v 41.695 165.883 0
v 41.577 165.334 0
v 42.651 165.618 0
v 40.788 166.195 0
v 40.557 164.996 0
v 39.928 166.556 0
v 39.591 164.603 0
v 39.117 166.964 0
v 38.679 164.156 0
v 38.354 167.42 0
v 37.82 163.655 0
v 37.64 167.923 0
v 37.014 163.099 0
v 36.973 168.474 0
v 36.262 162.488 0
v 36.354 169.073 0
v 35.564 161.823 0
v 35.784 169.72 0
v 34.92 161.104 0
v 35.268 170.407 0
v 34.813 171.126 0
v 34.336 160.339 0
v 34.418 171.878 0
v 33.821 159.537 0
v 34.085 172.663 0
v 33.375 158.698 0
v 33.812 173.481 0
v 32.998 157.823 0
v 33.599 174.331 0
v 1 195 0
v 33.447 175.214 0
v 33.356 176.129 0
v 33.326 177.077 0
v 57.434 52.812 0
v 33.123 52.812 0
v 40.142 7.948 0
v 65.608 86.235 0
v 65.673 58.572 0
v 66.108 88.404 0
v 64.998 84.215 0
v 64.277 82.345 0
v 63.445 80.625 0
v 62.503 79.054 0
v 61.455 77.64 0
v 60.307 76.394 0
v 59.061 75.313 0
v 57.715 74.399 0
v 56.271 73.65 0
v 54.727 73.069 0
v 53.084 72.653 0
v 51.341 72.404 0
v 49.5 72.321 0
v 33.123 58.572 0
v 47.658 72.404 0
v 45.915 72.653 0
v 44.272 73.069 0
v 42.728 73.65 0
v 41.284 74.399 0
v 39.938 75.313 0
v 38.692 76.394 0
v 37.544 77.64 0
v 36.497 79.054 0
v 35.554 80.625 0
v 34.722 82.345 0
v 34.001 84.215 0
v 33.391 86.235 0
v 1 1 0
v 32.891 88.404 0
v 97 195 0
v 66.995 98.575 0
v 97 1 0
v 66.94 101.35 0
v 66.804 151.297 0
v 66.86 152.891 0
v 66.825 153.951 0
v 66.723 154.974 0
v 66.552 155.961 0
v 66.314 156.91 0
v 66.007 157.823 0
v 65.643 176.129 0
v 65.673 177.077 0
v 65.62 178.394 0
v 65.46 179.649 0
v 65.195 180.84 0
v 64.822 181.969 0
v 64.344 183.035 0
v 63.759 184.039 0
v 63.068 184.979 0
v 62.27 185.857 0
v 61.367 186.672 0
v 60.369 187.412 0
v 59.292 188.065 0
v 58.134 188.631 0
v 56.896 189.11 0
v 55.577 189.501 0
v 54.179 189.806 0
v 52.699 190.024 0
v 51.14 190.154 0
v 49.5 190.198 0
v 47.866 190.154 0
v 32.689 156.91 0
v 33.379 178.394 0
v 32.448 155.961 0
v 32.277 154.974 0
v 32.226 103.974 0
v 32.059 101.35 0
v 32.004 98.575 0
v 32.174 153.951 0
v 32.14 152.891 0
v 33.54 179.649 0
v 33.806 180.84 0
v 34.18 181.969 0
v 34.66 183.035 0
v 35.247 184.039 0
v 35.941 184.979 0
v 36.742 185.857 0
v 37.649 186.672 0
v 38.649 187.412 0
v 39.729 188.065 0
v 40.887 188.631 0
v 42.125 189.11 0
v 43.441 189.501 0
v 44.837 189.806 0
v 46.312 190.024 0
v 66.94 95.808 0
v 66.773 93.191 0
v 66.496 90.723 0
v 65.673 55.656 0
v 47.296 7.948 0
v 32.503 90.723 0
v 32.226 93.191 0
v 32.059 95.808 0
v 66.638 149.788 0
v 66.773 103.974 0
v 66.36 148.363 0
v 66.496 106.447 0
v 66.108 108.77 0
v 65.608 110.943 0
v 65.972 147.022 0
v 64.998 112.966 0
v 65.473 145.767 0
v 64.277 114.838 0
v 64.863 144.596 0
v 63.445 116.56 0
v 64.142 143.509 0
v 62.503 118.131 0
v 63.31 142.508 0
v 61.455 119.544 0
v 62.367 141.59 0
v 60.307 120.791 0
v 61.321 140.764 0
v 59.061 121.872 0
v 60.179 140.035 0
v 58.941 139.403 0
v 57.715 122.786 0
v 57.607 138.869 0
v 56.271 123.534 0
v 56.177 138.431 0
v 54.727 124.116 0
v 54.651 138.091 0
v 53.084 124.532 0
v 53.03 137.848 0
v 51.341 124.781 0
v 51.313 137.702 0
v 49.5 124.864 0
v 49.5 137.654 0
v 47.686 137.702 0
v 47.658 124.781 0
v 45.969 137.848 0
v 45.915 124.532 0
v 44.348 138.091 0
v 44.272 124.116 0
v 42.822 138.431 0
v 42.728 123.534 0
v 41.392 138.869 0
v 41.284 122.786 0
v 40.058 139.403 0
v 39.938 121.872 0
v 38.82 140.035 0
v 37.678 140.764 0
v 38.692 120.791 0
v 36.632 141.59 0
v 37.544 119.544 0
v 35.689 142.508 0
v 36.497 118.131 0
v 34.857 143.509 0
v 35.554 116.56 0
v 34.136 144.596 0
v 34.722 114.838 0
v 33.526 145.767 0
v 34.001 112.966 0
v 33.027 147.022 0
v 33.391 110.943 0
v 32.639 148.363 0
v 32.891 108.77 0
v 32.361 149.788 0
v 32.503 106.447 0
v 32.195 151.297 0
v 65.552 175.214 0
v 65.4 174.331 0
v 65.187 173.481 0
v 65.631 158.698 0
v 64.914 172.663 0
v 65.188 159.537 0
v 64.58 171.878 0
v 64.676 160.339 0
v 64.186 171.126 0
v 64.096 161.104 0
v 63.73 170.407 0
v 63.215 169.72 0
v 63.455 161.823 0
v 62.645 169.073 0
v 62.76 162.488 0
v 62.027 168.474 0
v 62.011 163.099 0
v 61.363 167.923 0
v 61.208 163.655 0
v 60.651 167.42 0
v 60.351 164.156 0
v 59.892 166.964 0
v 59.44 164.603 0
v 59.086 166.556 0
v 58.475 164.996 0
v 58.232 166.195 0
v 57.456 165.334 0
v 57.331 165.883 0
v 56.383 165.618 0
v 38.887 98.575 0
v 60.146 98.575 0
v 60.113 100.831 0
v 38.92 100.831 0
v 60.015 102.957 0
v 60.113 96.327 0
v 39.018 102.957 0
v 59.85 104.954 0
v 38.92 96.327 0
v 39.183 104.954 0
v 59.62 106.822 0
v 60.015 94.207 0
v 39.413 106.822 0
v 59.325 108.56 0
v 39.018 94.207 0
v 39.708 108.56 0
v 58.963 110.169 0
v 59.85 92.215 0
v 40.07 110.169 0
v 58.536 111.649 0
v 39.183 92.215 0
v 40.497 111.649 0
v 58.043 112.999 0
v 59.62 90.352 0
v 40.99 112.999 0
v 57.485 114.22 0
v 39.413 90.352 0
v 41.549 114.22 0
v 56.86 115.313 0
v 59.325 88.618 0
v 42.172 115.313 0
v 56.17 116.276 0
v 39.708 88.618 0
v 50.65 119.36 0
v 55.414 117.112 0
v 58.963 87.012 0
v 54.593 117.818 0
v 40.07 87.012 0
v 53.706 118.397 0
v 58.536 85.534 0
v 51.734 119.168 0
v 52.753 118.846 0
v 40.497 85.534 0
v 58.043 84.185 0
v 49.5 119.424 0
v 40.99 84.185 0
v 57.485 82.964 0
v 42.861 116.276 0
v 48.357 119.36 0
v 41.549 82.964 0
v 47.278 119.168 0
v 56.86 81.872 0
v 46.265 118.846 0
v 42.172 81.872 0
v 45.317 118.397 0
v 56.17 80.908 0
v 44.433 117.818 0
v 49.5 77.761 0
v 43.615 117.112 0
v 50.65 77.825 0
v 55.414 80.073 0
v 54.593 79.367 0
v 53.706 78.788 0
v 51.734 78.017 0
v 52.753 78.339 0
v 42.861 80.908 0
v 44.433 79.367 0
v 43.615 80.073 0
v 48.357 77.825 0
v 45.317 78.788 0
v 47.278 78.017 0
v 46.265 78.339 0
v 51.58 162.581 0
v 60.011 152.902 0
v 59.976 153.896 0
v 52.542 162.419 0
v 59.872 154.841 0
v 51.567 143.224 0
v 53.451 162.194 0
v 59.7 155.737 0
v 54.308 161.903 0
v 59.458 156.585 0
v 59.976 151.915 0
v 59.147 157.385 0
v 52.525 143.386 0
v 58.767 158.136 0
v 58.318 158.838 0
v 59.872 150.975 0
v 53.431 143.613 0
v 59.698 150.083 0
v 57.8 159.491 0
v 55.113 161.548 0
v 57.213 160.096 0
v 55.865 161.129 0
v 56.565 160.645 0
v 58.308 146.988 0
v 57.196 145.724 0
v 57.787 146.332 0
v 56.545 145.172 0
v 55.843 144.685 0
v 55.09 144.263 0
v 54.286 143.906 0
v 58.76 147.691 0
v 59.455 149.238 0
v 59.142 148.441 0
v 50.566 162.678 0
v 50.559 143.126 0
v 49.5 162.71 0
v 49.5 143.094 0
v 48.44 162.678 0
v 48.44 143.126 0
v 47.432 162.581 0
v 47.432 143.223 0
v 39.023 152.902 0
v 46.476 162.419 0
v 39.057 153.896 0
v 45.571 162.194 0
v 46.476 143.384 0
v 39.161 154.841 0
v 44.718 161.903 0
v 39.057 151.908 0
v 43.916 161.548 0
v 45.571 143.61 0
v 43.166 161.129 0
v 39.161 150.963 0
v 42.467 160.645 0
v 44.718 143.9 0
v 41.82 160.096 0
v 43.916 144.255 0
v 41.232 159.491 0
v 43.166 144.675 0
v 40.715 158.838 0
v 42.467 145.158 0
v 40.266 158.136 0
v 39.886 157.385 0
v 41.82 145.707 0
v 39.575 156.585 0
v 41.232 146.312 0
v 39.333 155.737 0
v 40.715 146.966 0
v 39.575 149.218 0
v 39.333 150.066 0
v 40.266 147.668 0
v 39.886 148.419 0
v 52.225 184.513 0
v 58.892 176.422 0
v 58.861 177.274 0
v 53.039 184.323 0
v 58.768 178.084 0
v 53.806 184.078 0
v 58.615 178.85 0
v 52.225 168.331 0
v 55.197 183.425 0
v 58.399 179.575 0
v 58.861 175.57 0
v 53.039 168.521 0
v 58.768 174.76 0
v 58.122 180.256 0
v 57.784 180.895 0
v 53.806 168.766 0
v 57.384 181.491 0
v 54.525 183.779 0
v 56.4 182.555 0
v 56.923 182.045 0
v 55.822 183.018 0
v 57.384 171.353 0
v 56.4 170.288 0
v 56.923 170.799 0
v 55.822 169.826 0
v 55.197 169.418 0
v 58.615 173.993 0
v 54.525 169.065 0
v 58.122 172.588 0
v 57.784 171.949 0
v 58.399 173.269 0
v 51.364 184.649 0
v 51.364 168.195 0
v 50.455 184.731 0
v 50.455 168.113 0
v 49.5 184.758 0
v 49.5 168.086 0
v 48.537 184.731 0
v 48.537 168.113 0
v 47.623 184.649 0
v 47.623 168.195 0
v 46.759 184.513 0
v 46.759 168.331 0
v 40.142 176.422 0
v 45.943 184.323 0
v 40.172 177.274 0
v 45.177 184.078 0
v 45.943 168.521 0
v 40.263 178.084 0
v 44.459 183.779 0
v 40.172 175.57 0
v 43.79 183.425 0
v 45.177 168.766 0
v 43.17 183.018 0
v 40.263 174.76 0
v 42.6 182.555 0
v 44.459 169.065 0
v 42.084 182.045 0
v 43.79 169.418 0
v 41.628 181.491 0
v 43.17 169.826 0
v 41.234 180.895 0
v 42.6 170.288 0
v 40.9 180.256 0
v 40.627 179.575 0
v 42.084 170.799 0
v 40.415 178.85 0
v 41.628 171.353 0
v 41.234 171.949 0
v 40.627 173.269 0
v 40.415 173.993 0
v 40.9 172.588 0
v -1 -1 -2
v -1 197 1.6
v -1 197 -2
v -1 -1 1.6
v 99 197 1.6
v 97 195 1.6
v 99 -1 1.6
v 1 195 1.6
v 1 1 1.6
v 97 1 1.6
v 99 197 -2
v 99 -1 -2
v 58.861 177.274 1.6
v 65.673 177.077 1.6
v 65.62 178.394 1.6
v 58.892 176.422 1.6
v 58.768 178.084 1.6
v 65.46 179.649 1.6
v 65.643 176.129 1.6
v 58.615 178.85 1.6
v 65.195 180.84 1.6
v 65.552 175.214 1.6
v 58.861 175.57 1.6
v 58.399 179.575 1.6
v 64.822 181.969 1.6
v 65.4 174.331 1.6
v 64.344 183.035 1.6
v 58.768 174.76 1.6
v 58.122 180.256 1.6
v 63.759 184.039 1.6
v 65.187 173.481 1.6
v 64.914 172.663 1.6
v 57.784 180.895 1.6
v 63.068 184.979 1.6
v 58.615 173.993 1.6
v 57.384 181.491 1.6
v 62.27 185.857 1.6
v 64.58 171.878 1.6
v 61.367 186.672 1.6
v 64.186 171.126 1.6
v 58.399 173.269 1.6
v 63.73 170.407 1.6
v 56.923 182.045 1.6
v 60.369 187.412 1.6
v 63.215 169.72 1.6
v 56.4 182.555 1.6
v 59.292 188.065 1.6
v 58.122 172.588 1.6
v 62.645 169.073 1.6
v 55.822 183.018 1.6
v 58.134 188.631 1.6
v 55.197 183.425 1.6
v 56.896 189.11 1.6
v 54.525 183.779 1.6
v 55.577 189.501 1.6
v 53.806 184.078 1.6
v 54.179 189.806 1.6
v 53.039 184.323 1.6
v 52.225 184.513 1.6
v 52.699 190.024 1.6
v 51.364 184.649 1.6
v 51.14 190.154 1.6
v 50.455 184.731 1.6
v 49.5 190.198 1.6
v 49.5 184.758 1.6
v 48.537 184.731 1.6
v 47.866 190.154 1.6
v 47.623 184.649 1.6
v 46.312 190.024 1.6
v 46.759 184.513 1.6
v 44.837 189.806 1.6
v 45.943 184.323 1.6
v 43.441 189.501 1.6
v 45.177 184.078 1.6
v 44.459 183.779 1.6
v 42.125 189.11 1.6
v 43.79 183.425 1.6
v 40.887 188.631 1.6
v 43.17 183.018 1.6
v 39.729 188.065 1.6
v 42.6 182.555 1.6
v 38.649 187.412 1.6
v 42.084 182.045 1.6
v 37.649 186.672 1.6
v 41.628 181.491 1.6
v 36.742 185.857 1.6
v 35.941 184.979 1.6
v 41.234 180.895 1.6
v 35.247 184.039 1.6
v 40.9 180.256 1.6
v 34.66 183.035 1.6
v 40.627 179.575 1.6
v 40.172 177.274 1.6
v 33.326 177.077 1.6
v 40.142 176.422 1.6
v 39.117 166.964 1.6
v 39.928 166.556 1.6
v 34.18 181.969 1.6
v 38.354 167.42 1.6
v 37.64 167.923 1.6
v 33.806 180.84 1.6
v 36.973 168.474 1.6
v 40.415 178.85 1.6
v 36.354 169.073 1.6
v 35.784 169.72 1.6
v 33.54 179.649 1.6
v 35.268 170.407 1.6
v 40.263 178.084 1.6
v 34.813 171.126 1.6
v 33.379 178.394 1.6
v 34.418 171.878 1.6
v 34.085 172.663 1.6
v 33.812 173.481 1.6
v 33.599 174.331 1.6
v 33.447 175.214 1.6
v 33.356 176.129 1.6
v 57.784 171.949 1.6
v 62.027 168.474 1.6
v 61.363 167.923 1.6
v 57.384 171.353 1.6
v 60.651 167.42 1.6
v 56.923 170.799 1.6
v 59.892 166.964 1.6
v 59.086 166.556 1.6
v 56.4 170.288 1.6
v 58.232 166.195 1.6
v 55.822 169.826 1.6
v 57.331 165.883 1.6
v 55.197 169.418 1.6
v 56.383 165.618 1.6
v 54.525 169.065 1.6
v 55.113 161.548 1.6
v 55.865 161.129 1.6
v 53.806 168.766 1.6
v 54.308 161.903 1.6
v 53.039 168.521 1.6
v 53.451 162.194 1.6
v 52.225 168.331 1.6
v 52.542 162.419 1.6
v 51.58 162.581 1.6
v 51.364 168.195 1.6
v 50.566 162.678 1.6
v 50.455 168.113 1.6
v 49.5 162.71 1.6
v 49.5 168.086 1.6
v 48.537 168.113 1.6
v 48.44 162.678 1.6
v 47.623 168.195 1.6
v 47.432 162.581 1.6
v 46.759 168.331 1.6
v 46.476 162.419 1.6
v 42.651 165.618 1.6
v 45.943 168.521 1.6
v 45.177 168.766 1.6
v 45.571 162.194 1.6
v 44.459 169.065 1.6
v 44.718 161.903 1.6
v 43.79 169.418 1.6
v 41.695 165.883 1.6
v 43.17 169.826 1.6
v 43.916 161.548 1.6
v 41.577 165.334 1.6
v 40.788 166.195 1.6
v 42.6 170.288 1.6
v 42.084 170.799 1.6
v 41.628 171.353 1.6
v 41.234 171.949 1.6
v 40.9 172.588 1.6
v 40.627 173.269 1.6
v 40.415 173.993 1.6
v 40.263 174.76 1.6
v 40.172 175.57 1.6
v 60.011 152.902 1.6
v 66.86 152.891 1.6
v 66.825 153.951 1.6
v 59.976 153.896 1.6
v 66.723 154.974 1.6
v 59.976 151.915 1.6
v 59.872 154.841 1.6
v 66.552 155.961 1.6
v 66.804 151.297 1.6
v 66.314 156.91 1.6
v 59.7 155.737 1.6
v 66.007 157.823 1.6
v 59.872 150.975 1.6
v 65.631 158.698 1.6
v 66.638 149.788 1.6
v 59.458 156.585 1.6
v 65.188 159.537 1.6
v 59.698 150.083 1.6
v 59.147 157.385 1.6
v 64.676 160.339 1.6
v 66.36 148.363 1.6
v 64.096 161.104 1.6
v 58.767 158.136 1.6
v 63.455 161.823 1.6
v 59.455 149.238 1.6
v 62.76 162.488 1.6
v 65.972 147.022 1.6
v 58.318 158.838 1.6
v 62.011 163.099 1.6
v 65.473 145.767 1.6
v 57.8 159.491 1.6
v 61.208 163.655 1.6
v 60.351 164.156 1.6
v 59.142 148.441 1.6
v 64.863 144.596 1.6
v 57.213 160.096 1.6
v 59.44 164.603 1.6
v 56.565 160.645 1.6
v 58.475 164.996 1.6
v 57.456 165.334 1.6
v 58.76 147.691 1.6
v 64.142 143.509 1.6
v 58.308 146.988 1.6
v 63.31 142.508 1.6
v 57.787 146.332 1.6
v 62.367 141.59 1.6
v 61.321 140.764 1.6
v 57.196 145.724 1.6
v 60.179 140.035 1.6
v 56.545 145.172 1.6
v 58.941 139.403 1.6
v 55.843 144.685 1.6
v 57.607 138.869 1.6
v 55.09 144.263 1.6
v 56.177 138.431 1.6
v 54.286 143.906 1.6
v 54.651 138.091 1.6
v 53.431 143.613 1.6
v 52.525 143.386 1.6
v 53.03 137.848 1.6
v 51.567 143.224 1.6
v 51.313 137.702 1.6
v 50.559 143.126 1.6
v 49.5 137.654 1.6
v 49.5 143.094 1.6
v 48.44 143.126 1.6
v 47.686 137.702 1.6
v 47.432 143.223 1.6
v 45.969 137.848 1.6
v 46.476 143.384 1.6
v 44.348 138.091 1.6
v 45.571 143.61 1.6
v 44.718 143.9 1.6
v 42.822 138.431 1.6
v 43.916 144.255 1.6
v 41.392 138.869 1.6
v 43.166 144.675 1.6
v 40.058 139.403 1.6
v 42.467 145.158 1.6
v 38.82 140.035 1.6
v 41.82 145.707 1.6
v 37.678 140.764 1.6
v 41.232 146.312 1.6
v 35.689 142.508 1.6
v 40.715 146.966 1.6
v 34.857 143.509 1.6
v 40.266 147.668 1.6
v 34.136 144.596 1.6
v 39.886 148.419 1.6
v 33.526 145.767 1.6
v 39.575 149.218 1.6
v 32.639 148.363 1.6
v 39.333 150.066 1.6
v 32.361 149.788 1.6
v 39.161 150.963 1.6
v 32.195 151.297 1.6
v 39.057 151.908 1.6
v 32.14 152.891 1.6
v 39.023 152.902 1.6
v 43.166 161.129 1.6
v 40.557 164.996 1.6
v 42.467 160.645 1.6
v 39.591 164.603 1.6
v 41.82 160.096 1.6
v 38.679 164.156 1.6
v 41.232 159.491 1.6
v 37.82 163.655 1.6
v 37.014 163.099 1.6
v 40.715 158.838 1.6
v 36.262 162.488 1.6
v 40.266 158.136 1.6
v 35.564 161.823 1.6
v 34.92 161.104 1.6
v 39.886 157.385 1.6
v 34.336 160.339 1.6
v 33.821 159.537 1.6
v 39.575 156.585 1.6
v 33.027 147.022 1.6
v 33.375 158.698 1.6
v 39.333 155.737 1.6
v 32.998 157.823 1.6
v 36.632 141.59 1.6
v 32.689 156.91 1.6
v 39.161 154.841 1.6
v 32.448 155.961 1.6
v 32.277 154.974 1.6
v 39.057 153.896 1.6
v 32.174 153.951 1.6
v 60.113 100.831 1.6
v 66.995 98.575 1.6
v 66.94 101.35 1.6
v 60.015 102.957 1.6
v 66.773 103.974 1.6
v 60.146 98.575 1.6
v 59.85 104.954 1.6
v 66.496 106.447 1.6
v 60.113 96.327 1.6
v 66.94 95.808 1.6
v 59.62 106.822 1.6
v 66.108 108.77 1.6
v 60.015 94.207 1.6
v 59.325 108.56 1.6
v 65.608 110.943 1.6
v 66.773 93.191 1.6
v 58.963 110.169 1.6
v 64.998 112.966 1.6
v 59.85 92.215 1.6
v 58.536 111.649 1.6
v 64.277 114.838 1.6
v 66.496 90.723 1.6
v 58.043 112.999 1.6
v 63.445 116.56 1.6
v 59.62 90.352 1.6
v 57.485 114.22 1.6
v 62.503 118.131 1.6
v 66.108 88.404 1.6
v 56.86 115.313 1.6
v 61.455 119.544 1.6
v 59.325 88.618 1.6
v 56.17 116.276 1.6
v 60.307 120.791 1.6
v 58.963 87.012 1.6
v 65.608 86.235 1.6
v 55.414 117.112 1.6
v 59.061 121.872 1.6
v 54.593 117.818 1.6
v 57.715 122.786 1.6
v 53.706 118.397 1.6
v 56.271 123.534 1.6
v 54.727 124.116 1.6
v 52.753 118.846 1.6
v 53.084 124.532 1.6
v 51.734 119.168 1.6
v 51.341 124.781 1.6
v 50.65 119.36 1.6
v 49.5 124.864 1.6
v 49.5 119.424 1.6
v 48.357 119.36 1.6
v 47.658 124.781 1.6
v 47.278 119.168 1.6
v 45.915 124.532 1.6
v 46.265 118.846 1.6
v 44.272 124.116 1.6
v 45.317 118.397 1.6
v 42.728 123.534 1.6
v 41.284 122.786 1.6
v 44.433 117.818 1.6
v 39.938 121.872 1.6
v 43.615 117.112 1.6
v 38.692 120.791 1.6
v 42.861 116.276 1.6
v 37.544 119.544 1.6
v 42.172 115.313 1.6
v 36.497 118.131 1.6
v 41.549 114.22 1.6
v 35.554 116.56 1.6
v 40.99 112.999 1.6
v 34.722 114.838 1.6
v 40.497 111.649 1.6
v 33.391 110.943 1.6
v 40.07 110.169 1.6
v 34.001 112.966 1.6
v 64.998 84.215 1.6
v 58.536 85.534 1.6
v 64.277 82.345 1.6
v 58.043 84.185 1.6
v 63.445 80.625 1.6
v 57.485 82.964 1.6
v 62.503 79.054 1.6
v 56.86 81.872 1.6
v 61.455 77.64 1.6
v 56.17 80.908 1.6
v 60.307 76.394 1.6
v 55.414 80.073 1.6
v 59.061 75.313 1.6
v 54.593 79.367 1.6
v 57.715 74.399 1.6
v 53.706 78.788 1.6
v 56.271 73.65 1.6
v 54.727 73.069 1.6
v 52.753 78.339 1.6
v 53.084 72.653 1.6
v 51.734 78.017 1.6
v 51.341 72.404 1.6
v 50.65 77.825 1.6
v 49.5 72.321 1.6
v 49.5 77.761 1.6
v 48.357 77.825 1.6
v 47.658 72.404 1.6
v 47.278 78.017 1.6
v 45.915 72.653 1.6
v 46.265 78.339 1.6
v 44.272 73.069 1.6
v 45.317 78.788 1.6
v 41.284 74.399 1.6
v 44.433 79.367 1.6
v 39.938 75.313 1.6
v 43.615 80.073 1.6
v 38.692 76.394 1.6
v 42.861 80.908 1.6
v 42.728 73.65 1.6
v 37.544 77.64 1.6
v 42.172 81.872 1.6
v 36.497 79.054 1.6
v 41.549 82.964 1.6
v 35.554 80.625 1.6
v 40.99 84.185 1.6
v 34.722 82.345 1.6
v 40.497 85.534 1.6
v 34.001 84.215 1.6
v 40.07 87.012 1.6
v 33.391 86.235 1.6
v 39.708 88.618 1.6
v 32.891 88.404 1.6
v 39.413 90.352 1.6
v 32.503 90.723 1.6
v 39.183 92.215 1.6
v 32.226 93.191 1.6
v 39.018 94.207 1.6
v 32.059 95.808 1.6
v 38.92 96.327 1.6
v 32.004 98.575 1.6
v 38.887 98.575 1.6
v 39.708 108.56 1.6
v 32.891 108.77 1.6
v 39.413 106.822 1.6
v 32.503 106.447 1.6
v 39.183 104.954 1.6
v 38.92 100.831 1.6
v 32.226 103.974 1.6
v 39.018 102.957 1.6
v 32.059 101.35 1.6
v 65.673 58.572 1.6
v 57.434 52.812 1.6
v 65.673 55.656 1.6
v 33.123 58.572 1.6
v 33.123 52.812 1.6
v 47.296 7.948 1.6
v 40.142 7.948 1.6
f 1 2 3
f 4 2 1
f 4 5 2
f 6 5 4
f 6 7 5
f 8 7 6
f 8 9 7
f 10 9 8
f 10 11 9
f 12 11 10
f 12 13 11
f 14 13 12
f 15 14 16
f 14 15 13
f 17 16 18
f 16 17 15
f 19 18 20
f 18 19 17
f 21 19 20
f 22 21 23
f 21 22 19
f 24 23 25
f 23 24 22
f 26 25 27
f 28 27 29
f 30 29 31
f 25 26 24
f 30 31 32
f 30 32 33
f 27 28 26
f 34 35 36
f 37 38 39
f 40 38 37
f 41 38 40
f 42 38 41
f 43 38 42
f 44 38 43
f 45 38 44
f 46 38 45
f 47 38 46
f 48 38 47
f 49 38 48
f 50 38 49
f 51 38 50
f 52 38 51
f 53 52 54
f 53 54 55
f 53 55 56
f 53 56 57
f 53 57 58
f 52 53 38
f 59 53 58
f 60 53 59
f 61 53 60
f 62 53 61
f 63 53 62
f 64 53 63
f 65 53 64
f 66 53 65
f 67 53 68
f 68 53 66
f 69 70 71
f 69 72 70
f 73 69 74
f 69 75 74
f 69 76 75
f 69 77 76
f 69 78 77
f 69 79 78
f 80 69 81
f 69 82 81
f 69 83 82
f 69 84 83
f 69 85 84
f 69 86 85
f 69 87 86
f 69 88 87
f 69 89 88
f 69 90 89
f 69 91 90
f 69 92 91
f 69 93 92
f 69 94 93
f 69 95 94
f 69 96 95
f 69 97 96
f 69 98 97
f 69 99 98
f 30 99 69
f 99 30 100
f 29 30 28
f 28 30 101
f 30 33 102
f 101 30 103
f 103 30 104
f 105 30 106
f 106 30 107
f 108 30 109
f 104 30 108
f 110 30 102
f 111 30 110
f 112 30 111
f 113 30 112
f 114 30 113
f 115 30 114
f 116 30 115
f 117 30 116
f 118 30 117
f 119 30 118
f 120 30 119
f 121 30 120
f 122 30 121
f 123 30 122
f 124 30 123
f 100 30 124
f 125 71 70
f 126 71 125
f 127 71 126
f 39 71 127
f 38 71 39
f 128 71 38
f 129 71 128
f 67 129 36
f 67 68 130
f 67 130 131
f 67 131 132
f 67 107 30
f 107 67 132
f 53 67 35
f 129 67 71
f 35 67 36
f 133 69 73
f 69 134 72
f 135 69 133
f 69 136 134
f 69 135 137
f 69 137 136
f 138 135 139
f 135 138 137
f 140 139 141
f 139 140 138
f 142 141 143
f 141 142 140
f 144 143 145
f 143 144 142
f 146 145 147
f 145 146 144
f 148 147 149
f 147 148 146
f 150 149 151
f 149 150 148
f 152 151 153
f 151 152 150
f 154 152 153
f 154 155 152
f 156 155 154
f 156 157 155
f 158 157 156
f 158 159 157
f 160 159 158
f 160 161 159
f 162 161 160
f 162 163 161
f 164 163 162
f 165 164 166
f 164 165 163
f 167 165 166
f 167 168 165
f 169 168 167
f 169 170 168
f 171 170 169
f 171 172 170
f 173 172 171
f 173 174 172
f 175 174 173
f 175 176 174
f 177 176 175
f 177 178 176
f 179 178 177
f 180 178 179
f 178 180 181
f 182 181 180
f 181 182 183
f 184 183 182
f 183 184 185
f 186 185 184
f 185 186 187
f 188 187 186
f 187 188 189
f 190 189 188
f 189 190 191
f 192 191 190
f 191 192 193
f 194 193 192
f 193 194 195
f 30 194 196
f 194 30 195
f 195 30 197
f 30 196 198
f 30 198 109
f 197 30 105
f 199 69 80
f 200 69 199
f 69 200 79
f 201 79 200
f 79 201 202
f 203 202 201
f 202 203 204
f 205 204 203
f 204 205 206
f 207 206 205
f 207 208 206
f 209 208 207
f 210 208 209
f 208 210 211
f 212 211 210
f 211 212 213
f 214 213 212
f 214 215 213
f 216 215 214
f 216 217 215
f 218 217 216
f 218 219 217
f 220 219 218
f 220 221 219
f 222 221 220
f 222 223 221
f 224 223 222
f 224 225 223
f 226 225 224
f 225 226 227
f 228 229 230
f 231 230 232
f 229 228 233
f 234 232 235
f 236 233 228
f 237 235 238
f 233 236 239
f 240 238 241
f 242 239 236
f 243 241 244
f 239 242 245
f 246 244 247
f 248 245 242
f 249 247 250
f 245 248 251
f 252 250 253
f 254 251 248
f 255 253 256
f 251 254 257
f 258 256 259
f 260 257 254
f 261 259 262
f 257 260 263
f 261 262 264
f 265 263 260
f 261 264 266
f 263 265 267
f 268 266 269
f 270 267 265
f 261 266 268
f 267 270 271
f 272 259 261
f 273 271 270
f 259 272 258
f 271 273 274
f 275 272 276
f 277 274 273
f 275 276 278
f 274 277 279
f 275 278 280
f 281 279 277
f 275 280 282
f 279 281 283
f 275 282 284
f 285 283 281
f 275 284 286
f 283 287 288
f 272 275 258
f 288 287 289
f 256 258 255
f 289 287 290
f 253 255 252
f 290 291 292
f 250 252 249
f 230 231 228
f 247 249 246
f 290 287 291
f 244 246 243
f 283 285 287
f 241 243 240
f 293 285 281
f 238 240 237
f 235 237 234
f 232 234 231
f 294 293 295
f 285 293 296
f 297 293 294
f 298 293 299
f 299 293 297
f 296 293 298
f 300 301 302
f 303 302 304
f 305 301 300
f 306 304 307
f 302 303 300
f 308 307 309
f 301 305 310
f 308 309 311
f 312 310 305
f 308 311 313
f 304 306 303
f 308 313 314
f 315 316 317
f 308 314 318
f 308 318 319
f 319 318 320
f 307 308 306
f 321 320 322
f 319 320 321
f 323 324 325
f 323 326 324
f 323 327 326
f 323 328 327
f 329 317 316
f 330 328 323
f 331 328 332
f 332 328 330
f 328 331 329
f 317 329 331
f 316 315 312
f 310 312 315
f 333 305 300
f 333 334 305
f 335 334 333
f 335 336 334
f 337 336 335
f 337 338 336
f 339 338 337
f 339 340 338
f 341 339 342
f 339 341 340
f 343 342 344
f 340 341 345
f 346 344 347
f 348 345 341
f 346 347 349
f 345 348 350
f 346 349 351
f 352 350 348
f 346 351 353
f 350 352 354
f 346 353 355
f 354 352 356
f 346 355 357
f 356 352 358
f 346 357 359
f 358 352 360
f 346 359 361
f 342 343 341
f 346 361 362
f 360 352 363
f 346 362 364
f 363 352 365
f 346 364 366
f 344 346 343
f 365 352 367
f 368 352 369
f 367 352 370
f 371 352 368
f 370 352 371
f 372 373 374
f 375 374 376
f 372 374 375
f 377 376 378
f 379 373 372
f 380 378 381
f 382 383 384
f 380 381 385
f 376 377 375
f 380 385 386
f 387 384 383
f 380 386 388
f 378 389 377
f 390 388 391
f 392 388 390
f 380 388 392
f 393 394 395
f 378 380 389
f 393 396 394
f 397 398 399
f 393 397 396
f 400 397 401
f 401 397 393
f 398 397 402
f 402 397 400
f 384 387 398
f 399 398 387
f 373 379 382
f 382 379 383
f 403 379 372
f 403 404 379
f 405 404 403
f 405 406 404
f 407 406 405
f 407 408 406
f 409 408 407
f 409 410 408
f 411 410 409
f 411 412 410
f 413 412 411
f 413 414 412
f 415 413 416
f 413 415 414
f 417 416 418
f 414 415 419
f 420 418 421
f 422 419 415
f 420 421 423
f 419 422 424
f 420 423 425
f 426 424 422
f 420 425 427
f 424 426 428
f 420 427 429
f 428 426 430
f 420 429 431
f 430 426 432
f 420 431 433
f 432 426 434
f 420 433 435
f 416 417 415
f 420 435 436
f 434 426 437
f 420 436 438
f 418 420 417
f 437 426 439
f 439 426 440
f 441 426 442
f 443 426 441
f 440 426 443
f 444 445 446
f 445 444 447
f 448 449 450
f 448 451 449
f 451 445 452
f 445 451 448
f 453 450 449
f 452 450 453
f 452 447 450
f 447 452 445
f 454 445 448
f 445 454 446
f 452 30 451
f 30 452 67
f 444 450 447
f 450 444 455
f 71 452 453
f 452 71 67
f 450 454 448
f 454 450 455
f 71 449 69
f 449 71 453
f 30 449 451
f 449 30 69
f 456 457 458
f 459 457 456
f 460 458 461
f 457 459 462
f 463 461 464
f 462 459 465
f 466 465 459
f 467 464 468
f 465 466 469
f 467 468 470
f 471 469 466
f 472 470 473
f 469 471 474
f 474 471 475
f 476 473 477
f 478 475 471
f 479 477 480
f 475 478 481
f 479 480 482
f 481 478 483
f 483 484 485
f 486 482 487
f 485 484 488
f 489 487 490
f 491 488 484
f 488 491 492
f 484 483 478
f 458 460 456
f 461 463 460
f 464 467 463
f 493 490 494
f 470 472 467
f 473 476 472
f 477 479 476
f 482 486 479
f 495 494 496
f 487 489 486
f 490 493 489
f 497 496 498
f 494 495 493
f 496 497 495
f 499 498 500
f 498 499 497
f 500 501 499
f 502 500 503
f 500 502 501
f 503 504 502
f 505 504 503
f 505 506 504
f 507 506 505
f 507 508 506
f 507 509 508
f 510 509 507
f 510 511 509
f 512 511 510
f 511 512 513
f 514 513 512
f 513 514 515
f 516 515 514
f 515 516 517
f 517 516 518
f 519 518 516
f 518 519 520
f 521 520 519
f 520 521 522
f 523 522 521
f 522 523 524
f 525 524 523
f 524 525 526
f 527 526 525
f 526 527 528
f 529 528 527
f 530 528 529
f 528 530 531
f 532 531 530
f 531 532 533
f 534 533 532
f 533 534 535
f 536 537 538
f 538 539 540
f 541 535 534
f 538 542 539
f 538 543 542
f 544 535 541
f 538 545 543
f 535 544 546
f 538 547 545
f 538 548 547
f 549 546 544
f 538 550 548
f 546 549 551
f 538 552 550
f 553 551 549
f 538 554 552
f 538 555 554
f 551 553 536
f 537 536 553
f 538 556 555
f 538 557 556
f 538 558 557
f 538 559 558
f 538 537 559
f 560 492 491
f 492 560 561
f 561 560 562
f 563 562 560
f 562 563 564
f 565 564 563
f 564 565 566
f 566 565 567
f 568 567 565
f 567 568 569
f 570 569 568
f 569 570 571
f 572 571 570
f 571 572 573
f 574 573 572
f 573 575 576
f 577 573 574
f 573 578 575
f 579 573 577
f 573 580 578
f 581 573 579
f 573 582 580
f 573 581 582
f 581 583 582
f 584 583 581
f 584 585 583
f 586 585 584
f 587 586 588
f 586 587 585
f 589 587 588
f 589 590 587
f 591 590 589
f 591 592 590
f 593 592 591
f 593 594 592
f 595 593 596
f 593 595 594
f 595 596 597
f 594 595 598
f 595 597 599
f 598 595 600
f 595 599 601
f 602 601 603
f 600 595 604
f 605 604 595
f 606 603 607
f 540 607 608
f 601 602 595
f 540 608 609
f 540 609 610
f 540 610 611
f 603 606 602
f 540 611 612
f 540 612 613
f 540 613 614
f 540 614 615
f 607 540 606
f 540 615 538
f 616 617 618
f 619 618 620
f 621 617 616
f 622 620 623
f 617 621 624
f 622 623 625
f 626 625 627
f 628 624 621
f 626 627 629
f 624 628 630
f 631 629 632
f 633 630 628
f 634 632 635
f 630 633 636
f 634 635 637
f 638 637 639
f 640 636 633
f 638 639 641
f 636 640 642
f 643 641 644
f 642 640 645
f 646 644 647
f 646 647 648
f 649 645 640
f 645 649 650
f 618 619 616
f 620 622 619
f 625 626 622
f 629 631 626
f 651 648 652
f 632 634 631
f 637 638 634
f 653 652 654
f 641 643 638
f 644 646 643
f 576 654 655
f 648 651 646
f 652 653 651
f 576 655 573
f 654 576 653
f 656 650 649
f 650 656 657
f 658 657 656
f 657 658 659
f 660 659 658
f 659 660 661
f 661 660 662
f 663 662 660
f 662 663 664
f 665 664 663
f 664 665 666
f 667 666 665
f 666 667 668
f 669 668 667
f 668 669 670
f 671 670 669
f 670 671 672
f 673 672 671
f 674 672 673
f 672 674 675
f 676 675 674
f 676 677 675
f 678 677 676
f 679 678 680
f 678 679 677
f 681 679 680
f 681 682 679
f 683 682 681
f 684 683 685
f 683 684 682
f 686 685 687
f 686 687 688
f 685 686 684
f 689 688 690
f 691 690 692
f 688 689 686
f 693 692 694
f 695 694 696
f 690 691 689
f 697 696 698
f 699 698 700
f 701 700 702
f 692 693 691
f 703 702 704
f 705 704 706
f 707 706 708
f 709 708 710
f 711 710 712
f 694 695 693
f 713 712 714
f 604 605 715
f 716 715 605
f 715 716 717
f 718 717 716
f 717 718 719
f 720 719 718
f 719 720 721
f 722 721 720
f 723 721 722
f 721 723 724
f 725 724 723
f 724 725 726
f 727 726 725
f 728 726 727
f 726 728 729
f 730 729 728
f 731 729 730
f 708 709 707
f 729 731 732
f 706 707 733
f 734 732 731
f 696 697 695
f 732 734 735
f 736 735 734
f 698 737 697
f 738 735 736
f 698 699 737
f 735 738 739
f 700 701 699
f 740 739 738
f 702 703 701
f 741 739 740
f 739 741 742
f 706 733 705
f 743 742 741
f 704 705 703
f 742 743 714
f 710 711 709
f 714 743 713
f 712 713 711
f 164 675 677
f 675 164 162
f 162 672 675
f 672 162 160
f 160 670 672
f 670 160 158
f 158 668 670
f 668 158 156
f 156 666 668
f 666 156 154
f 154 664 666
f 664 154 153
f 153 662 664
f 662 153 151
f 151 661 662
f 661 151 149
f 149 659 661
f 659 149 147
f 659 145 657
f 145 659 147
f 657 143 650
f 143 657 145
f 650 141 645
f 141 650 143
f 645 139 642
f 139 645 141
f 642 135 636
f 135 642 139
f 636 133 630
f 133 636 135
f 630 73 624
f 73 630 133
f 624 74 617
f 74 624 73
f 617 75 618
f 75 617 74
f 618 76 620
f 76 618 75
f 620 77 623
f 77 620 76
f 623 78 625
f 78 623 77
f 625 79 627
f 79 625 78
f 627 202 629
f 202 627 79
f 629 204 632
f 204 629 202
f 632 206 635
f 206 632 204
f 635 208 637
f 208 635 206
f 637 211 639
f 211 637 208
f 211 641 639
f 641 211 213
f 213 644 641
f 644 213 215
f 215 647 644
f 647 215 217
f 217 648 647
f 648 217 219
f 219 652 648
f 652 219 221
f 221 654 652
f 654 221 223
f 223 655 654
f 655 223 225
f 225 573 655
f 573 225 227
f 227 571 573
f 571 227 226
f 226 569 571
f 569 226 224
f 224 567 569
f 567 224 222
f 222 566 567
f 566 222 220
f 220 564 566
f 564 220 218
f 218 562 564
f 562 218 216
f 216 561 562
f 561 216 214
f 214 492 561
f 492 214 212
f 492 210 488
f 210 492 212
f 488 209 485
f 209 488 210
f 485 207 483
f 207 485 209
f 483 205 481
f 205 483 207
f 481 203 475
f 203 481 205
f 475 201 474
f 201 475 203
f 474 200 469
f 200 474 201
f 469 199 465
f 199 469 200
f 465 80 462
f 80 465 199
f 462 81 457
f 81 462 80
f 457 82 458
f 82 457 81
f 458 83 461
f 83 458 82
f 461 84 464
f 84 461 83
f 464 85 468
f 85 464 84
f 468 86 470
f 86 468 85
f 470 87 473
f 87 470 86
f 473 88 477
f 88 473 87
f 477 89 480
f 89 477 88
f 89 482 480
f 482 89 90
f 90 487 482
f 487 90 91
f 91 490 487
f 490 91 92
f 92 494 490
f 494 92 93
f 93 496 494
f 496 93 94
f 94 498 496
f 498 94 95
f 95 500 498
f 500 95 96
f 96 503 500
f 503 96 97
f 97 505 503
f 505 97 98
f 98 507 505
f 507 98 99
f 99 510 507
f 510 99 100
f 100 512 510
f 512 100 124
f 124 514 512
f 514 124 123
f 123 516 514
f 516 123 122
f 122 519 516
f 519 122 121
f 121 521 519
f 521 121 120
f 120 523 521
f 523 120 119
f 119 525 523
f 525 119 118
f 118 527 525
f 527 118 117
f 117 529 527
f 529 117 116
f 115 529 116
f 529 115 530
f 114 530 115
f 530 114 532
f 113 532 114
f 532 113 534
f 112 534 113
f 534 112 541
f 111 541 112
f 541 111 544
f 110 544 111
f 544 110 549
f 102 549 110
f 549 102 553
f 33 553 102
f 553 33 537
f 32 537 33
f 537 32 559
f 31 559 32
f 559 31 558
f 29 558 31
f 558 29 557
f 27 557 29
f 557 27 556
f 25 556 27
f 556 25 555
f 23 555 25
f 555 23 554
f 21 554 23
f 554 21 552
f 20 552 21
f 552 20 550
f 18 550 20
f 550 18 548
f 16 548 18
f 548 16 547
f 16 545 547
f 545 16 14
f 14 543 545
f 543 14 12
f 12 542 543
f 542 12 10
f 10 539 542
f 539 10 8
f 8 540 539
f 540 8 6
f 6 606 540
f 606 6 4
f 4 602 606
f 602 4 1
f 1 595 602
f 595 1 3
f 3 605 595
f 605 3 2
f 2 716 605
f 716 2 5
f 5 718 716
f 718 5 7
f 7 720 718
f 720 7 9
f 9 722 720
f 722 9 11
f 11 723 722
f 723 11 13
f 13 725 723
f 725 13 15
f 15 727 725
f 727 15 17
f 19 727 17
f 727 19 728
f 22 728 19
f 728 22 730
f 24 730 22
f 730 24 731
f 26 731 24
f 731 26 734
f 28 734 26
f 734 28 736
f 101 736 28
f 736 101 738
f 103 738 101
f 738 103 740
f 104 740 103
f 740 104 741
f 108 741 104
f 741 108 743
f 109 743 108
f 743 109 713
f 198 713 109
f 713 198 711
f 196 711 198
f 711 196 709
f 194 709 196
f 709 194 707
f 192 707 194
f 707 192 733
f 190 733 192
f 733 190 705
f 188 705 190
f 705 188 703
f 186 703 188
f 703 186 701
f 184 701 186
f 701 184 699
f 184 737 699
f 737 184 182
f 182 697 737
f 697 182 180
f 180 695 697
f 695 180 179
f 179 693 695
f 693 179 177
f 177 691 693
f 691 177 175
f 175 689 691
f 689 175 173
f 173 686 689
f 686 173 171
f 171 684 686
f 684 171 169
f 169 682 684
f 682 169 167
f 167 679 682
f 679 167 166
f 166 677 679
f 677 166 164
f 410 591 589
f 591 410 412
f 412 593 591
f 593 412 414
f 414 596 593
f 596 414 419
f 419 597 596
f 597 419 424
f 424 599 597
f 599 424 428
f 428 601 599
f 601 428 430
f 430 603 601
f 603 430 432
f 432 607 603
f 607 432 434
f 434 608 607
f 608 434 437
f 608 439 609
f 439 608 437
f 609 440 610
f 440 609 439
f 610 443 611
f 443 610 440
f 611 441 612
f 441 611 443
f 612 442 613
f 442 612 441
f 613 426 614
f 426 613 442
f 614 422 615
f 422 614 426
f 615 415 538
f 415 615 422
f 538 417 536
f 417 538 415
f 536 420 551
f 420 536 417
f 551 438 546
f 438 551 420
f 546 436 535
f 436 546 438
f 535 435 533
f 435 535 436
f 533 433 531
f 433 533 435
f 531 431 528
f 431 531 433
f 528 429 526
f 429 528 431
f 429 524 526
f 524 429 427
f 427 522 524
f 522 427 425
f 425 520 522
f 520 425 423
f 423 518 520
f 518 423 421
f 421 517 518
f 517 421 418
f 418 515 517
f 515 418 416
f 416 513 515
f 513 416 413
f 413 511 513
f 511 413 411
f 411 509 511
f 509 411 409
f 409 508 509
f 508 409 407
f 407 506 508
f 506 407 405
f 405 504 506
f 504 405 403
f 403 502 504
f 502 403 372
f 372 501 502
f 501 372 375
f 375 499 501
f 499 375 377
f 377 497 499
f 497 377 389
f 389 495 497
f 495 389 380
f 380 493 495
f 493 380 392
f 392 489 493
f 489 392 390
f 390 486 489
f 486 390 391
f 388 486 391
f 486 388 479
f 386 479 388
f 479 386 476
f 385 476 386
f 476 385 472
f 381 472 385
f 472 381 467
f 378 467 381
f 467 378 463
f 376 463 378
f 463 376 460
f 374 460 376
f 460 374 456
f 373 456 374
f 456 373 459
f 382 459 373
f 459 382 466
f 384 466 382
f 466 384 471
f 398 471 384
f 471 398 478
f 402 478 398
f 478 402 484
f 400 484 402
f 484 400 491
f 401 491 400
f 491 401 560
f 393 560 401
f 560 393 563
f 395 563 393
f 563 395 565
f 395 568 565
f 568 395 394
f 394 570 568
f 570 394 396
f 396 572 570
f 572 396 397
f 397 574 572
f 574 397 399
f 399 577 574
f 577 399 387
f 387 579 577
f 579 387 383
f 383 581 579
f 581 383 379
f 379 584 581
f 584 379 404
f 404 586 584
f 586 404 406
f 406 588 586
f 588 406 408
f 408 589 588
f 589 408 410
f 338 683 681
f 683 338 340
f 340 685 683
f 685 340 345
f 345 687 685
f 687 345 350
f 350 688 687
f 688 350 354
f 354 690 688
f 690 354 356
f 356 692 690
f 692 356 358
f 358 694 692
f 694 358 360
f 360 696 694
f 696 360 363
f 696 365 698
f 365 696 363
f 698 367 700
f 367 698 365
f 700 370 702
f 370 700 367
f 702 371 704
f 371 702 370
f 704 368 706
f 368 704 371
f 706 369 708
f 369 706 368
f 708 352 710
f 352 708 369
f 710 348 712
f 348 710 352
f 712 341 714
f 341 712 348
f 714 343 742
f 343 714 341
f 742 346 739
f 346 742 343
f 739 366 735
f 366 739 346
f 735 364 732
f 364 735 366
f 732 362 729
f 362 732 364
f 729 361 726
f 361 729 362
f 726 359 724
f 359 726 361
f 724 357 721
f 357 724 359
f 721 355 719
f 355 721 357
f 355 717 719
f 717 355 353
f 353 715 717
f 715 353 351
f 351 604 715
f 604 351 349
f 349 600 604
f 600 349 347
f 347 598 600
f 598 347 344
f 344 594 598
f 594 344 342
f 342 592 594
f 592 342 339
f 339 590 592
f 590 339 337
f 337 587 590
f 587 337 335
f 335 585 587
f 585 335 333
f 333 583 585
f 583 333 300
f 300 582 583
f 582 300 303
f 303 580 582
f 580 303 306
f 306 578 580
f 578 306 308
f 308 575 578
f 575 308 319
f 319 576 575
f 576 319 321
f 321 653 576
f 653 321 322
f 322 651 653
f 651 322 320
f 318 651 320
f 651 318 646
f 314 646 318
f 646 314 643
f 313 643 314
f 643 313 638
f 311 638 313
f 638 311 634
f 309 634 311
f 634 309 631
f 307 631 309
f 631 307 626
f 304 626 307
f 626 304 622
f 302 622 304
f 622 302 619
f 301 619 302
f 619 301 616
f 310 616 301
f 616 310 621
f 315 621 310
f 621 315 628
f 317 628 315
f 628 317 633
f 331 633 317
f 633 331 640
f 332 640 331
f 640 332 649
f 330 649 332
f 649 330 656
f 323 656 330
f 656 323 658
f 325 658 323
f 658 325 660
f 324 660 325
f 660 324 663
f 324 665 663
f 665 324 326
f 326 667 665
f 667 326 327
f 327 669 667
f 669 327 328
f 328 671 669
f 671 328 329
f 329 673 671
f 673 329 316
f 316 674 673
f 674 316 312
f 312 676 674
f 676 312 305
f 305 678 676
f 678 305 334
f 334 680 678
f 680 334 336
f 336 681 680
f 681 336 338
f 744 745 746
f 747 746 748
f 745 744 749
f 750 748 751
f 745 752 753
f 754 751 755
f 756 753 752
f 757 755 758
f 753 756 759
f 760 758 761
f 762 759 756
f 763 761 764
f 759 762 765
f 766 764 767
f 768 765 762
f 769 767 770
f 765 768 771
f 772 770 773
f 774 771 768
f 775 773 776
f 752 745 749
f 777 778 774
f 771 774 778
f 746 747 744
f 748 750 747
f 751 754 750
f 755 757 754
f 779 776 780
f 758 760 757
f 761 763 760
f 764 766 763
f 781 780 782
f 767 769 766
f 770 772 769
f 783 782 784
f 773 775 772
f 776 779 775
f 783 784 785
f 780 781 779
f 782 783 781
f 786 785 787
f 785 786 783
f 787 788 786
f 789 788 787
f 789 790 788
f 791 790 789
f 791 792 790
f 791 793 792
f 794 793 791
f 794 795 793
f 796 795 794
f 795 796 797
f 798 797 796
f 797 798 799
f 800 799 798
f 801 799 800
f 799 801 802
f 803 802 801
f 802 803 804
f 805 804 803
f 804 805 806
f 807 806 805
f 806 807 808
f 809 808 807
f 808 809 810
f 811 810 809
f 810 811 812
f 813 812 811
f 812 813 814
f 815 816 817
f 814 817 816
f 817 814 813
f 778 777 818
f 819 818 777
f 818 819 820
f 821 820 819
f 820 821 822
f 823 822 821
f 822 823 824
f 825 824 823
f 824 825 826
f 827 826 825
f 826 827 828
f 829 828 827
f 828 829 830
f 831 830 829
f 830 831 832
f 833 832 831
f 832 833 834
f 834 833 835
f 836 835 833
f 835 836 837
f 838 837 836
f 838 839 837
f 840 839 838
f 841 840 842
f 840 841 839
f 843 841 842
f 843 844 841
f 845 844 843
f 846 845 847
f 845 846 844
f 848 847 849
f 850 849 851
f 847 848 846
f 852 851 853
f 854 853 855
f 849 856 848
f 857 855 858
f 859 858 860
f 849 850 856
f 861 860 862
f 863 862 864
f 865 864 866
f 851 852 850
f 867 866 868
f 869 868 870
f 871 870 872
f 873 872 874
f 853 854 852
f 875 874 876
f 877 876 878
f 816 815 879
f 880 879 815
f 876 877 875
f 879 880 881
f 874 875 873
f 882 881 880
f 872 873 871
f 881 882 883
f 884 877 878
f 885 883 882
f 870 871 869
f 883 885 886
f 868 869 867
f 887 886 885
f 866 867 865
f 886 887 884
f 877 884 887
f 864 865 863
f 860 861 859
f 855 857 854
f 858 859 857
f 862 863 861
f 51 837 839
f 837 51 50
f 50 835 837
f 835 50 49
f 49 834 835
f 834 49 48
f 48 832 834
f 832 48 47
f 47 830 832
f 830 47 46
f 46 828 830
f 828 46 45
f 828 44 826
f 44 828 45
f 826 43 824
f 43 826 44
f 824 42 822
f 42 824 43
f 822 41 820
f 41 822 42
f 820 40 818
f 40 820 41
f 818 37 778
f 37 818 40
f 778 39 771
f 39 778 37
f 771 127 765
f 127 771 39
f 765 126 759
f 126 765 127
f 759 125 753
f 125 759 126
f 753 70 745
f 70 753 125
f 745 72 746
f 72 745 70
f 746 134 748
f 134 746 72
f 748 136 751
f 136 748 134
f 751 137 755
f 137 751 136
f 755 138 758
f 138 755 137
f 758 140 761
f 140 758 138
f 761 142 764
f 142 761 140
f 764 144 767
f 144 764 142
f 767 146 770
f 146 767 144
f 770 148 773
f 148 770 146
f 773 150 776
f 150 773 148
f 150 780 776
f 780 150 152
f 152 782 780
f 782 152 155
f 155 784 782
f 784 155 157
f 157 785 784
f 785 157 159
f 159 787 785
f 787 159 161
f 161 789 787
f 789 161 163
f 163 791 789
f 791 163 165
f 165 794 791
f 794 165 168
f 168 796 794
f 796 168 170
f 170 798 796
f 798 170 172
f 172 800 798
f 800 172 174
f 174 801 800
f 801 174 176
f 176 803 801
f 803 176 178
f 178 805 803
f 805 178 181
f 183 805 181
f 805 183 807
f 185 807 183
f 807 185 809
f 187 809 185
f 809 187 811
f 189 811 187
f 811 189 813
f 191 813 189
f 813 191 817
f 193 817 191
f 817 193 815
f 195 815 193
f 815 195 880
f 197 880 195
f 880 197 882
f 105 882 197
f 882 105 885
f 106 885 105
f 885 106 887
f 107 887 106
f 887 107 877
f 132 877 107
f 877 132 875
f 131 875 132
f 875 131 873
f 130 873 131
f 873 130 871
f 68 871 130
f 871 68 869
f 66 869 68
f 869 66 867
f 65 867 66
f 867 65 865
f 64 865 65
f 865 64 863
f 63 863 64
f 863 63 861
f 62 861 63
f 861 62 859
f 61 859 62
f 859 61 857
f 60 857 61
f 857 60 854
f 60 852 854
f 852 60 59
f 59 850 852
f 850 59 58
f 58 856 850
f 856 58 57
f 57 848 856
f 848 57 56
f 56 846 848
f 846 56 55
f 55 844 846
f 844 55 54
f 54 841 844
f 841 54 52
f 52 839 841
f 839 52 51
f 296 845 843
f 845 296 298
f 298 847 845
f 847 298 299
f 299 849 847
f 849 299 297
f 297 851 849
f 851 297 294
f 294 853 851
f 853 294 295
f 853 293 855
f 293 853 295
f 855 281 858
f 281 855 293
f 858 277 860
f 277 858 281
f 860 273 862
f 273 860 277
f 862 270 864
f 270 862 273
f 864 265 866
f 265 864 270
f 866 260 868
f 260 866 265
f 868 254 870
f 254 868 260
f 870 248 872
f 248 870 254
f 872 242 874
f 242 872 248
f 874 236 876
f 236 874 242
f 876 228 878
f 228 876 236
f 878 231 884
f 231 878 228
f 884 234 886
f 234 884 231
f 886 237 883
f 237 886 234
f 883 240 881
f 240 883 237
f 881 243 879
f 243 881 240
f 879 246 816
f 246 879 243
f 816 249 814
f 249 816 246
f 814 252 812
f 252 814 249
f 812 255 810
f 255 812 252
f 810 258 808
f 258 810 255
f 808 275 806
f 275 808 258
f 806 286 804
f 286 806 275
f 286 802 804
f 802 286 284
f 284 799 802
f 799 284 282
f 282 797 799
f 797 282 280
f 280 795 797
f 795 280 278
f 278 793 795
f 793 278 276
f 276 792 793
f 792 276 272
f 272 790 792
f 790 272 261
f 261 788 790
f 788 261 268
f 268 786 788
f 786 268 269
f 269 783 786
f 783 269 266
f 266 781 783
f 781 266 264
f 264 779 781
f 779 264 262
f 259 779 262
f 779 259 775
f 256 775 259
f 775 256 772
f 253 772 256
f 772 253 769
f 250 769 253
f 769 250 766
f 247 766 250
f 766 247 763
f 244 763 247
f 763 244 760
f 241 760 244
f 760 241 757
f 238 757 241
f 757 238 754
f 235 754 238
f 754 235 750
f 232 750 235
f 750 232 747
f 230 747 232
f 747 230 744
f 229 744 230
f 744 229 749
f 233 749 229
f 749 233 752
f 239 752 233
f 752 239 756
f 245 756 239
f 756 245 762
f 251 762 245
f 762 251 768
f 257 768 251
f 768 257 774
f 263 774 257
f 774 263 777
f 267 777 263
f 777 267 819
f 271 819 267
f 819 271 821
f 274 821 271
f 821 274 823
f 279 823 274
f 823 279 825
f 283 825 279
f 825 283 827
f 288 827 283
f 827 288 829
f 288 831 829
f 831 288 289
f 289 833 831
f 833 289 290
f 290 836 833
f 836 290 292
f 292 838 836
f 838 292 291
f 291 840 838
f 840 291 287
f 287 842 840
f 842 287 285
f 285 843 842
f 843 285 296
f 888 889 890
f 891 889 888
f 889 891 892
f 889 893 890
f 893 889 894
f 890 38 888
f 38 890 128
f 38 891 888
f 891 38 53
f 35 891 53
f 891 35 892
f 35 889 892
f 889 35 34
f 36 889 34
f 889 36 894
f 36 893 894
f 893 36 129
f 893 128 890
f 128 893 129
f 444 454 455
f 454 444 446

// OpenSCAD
line_width = 2;
plaque_width = 100 - line_width;
plaque_height = 2*plaque_width;
text_data = "807";
characters = len(text_data);
figure_thickness = 2;
font_size = 50;
font_height = 1.6;
font_style = "Nautilus Pompilius:style=Regular";
font_horizontal_offset = 0;

$fn=64;

module line(w, h, a, b) {
    linear_extrude(h) hull() {
        translate(a) square(w, center=true);
        translate(b) square(w, center=true);
    }
}

color("#e0ffe0") translate([-line_width/2, -line_width/2, -figure_thickness]) cube([plaque_width+line_width, plaque_height+line_width, figure_thickness]);
color("black") for (i=[0, 1]) {
    line(line_width, font_height, [plaque_width*i, 0], [plaque_width*i, plaque_height]);
    line(line_width, font_height, [0, plaque_height*i], [plaque_width, plaque_height*i]);
}
color("black") for (i=[0:characters-1]) {
    linear_extrude(font_height) translate([plaque_width/2+font_horizontal_offset, plaque_height/characters*(characters-i-0.5)]) text(text_data[i], font_size, font_style, halign="center", valign="center");
}
